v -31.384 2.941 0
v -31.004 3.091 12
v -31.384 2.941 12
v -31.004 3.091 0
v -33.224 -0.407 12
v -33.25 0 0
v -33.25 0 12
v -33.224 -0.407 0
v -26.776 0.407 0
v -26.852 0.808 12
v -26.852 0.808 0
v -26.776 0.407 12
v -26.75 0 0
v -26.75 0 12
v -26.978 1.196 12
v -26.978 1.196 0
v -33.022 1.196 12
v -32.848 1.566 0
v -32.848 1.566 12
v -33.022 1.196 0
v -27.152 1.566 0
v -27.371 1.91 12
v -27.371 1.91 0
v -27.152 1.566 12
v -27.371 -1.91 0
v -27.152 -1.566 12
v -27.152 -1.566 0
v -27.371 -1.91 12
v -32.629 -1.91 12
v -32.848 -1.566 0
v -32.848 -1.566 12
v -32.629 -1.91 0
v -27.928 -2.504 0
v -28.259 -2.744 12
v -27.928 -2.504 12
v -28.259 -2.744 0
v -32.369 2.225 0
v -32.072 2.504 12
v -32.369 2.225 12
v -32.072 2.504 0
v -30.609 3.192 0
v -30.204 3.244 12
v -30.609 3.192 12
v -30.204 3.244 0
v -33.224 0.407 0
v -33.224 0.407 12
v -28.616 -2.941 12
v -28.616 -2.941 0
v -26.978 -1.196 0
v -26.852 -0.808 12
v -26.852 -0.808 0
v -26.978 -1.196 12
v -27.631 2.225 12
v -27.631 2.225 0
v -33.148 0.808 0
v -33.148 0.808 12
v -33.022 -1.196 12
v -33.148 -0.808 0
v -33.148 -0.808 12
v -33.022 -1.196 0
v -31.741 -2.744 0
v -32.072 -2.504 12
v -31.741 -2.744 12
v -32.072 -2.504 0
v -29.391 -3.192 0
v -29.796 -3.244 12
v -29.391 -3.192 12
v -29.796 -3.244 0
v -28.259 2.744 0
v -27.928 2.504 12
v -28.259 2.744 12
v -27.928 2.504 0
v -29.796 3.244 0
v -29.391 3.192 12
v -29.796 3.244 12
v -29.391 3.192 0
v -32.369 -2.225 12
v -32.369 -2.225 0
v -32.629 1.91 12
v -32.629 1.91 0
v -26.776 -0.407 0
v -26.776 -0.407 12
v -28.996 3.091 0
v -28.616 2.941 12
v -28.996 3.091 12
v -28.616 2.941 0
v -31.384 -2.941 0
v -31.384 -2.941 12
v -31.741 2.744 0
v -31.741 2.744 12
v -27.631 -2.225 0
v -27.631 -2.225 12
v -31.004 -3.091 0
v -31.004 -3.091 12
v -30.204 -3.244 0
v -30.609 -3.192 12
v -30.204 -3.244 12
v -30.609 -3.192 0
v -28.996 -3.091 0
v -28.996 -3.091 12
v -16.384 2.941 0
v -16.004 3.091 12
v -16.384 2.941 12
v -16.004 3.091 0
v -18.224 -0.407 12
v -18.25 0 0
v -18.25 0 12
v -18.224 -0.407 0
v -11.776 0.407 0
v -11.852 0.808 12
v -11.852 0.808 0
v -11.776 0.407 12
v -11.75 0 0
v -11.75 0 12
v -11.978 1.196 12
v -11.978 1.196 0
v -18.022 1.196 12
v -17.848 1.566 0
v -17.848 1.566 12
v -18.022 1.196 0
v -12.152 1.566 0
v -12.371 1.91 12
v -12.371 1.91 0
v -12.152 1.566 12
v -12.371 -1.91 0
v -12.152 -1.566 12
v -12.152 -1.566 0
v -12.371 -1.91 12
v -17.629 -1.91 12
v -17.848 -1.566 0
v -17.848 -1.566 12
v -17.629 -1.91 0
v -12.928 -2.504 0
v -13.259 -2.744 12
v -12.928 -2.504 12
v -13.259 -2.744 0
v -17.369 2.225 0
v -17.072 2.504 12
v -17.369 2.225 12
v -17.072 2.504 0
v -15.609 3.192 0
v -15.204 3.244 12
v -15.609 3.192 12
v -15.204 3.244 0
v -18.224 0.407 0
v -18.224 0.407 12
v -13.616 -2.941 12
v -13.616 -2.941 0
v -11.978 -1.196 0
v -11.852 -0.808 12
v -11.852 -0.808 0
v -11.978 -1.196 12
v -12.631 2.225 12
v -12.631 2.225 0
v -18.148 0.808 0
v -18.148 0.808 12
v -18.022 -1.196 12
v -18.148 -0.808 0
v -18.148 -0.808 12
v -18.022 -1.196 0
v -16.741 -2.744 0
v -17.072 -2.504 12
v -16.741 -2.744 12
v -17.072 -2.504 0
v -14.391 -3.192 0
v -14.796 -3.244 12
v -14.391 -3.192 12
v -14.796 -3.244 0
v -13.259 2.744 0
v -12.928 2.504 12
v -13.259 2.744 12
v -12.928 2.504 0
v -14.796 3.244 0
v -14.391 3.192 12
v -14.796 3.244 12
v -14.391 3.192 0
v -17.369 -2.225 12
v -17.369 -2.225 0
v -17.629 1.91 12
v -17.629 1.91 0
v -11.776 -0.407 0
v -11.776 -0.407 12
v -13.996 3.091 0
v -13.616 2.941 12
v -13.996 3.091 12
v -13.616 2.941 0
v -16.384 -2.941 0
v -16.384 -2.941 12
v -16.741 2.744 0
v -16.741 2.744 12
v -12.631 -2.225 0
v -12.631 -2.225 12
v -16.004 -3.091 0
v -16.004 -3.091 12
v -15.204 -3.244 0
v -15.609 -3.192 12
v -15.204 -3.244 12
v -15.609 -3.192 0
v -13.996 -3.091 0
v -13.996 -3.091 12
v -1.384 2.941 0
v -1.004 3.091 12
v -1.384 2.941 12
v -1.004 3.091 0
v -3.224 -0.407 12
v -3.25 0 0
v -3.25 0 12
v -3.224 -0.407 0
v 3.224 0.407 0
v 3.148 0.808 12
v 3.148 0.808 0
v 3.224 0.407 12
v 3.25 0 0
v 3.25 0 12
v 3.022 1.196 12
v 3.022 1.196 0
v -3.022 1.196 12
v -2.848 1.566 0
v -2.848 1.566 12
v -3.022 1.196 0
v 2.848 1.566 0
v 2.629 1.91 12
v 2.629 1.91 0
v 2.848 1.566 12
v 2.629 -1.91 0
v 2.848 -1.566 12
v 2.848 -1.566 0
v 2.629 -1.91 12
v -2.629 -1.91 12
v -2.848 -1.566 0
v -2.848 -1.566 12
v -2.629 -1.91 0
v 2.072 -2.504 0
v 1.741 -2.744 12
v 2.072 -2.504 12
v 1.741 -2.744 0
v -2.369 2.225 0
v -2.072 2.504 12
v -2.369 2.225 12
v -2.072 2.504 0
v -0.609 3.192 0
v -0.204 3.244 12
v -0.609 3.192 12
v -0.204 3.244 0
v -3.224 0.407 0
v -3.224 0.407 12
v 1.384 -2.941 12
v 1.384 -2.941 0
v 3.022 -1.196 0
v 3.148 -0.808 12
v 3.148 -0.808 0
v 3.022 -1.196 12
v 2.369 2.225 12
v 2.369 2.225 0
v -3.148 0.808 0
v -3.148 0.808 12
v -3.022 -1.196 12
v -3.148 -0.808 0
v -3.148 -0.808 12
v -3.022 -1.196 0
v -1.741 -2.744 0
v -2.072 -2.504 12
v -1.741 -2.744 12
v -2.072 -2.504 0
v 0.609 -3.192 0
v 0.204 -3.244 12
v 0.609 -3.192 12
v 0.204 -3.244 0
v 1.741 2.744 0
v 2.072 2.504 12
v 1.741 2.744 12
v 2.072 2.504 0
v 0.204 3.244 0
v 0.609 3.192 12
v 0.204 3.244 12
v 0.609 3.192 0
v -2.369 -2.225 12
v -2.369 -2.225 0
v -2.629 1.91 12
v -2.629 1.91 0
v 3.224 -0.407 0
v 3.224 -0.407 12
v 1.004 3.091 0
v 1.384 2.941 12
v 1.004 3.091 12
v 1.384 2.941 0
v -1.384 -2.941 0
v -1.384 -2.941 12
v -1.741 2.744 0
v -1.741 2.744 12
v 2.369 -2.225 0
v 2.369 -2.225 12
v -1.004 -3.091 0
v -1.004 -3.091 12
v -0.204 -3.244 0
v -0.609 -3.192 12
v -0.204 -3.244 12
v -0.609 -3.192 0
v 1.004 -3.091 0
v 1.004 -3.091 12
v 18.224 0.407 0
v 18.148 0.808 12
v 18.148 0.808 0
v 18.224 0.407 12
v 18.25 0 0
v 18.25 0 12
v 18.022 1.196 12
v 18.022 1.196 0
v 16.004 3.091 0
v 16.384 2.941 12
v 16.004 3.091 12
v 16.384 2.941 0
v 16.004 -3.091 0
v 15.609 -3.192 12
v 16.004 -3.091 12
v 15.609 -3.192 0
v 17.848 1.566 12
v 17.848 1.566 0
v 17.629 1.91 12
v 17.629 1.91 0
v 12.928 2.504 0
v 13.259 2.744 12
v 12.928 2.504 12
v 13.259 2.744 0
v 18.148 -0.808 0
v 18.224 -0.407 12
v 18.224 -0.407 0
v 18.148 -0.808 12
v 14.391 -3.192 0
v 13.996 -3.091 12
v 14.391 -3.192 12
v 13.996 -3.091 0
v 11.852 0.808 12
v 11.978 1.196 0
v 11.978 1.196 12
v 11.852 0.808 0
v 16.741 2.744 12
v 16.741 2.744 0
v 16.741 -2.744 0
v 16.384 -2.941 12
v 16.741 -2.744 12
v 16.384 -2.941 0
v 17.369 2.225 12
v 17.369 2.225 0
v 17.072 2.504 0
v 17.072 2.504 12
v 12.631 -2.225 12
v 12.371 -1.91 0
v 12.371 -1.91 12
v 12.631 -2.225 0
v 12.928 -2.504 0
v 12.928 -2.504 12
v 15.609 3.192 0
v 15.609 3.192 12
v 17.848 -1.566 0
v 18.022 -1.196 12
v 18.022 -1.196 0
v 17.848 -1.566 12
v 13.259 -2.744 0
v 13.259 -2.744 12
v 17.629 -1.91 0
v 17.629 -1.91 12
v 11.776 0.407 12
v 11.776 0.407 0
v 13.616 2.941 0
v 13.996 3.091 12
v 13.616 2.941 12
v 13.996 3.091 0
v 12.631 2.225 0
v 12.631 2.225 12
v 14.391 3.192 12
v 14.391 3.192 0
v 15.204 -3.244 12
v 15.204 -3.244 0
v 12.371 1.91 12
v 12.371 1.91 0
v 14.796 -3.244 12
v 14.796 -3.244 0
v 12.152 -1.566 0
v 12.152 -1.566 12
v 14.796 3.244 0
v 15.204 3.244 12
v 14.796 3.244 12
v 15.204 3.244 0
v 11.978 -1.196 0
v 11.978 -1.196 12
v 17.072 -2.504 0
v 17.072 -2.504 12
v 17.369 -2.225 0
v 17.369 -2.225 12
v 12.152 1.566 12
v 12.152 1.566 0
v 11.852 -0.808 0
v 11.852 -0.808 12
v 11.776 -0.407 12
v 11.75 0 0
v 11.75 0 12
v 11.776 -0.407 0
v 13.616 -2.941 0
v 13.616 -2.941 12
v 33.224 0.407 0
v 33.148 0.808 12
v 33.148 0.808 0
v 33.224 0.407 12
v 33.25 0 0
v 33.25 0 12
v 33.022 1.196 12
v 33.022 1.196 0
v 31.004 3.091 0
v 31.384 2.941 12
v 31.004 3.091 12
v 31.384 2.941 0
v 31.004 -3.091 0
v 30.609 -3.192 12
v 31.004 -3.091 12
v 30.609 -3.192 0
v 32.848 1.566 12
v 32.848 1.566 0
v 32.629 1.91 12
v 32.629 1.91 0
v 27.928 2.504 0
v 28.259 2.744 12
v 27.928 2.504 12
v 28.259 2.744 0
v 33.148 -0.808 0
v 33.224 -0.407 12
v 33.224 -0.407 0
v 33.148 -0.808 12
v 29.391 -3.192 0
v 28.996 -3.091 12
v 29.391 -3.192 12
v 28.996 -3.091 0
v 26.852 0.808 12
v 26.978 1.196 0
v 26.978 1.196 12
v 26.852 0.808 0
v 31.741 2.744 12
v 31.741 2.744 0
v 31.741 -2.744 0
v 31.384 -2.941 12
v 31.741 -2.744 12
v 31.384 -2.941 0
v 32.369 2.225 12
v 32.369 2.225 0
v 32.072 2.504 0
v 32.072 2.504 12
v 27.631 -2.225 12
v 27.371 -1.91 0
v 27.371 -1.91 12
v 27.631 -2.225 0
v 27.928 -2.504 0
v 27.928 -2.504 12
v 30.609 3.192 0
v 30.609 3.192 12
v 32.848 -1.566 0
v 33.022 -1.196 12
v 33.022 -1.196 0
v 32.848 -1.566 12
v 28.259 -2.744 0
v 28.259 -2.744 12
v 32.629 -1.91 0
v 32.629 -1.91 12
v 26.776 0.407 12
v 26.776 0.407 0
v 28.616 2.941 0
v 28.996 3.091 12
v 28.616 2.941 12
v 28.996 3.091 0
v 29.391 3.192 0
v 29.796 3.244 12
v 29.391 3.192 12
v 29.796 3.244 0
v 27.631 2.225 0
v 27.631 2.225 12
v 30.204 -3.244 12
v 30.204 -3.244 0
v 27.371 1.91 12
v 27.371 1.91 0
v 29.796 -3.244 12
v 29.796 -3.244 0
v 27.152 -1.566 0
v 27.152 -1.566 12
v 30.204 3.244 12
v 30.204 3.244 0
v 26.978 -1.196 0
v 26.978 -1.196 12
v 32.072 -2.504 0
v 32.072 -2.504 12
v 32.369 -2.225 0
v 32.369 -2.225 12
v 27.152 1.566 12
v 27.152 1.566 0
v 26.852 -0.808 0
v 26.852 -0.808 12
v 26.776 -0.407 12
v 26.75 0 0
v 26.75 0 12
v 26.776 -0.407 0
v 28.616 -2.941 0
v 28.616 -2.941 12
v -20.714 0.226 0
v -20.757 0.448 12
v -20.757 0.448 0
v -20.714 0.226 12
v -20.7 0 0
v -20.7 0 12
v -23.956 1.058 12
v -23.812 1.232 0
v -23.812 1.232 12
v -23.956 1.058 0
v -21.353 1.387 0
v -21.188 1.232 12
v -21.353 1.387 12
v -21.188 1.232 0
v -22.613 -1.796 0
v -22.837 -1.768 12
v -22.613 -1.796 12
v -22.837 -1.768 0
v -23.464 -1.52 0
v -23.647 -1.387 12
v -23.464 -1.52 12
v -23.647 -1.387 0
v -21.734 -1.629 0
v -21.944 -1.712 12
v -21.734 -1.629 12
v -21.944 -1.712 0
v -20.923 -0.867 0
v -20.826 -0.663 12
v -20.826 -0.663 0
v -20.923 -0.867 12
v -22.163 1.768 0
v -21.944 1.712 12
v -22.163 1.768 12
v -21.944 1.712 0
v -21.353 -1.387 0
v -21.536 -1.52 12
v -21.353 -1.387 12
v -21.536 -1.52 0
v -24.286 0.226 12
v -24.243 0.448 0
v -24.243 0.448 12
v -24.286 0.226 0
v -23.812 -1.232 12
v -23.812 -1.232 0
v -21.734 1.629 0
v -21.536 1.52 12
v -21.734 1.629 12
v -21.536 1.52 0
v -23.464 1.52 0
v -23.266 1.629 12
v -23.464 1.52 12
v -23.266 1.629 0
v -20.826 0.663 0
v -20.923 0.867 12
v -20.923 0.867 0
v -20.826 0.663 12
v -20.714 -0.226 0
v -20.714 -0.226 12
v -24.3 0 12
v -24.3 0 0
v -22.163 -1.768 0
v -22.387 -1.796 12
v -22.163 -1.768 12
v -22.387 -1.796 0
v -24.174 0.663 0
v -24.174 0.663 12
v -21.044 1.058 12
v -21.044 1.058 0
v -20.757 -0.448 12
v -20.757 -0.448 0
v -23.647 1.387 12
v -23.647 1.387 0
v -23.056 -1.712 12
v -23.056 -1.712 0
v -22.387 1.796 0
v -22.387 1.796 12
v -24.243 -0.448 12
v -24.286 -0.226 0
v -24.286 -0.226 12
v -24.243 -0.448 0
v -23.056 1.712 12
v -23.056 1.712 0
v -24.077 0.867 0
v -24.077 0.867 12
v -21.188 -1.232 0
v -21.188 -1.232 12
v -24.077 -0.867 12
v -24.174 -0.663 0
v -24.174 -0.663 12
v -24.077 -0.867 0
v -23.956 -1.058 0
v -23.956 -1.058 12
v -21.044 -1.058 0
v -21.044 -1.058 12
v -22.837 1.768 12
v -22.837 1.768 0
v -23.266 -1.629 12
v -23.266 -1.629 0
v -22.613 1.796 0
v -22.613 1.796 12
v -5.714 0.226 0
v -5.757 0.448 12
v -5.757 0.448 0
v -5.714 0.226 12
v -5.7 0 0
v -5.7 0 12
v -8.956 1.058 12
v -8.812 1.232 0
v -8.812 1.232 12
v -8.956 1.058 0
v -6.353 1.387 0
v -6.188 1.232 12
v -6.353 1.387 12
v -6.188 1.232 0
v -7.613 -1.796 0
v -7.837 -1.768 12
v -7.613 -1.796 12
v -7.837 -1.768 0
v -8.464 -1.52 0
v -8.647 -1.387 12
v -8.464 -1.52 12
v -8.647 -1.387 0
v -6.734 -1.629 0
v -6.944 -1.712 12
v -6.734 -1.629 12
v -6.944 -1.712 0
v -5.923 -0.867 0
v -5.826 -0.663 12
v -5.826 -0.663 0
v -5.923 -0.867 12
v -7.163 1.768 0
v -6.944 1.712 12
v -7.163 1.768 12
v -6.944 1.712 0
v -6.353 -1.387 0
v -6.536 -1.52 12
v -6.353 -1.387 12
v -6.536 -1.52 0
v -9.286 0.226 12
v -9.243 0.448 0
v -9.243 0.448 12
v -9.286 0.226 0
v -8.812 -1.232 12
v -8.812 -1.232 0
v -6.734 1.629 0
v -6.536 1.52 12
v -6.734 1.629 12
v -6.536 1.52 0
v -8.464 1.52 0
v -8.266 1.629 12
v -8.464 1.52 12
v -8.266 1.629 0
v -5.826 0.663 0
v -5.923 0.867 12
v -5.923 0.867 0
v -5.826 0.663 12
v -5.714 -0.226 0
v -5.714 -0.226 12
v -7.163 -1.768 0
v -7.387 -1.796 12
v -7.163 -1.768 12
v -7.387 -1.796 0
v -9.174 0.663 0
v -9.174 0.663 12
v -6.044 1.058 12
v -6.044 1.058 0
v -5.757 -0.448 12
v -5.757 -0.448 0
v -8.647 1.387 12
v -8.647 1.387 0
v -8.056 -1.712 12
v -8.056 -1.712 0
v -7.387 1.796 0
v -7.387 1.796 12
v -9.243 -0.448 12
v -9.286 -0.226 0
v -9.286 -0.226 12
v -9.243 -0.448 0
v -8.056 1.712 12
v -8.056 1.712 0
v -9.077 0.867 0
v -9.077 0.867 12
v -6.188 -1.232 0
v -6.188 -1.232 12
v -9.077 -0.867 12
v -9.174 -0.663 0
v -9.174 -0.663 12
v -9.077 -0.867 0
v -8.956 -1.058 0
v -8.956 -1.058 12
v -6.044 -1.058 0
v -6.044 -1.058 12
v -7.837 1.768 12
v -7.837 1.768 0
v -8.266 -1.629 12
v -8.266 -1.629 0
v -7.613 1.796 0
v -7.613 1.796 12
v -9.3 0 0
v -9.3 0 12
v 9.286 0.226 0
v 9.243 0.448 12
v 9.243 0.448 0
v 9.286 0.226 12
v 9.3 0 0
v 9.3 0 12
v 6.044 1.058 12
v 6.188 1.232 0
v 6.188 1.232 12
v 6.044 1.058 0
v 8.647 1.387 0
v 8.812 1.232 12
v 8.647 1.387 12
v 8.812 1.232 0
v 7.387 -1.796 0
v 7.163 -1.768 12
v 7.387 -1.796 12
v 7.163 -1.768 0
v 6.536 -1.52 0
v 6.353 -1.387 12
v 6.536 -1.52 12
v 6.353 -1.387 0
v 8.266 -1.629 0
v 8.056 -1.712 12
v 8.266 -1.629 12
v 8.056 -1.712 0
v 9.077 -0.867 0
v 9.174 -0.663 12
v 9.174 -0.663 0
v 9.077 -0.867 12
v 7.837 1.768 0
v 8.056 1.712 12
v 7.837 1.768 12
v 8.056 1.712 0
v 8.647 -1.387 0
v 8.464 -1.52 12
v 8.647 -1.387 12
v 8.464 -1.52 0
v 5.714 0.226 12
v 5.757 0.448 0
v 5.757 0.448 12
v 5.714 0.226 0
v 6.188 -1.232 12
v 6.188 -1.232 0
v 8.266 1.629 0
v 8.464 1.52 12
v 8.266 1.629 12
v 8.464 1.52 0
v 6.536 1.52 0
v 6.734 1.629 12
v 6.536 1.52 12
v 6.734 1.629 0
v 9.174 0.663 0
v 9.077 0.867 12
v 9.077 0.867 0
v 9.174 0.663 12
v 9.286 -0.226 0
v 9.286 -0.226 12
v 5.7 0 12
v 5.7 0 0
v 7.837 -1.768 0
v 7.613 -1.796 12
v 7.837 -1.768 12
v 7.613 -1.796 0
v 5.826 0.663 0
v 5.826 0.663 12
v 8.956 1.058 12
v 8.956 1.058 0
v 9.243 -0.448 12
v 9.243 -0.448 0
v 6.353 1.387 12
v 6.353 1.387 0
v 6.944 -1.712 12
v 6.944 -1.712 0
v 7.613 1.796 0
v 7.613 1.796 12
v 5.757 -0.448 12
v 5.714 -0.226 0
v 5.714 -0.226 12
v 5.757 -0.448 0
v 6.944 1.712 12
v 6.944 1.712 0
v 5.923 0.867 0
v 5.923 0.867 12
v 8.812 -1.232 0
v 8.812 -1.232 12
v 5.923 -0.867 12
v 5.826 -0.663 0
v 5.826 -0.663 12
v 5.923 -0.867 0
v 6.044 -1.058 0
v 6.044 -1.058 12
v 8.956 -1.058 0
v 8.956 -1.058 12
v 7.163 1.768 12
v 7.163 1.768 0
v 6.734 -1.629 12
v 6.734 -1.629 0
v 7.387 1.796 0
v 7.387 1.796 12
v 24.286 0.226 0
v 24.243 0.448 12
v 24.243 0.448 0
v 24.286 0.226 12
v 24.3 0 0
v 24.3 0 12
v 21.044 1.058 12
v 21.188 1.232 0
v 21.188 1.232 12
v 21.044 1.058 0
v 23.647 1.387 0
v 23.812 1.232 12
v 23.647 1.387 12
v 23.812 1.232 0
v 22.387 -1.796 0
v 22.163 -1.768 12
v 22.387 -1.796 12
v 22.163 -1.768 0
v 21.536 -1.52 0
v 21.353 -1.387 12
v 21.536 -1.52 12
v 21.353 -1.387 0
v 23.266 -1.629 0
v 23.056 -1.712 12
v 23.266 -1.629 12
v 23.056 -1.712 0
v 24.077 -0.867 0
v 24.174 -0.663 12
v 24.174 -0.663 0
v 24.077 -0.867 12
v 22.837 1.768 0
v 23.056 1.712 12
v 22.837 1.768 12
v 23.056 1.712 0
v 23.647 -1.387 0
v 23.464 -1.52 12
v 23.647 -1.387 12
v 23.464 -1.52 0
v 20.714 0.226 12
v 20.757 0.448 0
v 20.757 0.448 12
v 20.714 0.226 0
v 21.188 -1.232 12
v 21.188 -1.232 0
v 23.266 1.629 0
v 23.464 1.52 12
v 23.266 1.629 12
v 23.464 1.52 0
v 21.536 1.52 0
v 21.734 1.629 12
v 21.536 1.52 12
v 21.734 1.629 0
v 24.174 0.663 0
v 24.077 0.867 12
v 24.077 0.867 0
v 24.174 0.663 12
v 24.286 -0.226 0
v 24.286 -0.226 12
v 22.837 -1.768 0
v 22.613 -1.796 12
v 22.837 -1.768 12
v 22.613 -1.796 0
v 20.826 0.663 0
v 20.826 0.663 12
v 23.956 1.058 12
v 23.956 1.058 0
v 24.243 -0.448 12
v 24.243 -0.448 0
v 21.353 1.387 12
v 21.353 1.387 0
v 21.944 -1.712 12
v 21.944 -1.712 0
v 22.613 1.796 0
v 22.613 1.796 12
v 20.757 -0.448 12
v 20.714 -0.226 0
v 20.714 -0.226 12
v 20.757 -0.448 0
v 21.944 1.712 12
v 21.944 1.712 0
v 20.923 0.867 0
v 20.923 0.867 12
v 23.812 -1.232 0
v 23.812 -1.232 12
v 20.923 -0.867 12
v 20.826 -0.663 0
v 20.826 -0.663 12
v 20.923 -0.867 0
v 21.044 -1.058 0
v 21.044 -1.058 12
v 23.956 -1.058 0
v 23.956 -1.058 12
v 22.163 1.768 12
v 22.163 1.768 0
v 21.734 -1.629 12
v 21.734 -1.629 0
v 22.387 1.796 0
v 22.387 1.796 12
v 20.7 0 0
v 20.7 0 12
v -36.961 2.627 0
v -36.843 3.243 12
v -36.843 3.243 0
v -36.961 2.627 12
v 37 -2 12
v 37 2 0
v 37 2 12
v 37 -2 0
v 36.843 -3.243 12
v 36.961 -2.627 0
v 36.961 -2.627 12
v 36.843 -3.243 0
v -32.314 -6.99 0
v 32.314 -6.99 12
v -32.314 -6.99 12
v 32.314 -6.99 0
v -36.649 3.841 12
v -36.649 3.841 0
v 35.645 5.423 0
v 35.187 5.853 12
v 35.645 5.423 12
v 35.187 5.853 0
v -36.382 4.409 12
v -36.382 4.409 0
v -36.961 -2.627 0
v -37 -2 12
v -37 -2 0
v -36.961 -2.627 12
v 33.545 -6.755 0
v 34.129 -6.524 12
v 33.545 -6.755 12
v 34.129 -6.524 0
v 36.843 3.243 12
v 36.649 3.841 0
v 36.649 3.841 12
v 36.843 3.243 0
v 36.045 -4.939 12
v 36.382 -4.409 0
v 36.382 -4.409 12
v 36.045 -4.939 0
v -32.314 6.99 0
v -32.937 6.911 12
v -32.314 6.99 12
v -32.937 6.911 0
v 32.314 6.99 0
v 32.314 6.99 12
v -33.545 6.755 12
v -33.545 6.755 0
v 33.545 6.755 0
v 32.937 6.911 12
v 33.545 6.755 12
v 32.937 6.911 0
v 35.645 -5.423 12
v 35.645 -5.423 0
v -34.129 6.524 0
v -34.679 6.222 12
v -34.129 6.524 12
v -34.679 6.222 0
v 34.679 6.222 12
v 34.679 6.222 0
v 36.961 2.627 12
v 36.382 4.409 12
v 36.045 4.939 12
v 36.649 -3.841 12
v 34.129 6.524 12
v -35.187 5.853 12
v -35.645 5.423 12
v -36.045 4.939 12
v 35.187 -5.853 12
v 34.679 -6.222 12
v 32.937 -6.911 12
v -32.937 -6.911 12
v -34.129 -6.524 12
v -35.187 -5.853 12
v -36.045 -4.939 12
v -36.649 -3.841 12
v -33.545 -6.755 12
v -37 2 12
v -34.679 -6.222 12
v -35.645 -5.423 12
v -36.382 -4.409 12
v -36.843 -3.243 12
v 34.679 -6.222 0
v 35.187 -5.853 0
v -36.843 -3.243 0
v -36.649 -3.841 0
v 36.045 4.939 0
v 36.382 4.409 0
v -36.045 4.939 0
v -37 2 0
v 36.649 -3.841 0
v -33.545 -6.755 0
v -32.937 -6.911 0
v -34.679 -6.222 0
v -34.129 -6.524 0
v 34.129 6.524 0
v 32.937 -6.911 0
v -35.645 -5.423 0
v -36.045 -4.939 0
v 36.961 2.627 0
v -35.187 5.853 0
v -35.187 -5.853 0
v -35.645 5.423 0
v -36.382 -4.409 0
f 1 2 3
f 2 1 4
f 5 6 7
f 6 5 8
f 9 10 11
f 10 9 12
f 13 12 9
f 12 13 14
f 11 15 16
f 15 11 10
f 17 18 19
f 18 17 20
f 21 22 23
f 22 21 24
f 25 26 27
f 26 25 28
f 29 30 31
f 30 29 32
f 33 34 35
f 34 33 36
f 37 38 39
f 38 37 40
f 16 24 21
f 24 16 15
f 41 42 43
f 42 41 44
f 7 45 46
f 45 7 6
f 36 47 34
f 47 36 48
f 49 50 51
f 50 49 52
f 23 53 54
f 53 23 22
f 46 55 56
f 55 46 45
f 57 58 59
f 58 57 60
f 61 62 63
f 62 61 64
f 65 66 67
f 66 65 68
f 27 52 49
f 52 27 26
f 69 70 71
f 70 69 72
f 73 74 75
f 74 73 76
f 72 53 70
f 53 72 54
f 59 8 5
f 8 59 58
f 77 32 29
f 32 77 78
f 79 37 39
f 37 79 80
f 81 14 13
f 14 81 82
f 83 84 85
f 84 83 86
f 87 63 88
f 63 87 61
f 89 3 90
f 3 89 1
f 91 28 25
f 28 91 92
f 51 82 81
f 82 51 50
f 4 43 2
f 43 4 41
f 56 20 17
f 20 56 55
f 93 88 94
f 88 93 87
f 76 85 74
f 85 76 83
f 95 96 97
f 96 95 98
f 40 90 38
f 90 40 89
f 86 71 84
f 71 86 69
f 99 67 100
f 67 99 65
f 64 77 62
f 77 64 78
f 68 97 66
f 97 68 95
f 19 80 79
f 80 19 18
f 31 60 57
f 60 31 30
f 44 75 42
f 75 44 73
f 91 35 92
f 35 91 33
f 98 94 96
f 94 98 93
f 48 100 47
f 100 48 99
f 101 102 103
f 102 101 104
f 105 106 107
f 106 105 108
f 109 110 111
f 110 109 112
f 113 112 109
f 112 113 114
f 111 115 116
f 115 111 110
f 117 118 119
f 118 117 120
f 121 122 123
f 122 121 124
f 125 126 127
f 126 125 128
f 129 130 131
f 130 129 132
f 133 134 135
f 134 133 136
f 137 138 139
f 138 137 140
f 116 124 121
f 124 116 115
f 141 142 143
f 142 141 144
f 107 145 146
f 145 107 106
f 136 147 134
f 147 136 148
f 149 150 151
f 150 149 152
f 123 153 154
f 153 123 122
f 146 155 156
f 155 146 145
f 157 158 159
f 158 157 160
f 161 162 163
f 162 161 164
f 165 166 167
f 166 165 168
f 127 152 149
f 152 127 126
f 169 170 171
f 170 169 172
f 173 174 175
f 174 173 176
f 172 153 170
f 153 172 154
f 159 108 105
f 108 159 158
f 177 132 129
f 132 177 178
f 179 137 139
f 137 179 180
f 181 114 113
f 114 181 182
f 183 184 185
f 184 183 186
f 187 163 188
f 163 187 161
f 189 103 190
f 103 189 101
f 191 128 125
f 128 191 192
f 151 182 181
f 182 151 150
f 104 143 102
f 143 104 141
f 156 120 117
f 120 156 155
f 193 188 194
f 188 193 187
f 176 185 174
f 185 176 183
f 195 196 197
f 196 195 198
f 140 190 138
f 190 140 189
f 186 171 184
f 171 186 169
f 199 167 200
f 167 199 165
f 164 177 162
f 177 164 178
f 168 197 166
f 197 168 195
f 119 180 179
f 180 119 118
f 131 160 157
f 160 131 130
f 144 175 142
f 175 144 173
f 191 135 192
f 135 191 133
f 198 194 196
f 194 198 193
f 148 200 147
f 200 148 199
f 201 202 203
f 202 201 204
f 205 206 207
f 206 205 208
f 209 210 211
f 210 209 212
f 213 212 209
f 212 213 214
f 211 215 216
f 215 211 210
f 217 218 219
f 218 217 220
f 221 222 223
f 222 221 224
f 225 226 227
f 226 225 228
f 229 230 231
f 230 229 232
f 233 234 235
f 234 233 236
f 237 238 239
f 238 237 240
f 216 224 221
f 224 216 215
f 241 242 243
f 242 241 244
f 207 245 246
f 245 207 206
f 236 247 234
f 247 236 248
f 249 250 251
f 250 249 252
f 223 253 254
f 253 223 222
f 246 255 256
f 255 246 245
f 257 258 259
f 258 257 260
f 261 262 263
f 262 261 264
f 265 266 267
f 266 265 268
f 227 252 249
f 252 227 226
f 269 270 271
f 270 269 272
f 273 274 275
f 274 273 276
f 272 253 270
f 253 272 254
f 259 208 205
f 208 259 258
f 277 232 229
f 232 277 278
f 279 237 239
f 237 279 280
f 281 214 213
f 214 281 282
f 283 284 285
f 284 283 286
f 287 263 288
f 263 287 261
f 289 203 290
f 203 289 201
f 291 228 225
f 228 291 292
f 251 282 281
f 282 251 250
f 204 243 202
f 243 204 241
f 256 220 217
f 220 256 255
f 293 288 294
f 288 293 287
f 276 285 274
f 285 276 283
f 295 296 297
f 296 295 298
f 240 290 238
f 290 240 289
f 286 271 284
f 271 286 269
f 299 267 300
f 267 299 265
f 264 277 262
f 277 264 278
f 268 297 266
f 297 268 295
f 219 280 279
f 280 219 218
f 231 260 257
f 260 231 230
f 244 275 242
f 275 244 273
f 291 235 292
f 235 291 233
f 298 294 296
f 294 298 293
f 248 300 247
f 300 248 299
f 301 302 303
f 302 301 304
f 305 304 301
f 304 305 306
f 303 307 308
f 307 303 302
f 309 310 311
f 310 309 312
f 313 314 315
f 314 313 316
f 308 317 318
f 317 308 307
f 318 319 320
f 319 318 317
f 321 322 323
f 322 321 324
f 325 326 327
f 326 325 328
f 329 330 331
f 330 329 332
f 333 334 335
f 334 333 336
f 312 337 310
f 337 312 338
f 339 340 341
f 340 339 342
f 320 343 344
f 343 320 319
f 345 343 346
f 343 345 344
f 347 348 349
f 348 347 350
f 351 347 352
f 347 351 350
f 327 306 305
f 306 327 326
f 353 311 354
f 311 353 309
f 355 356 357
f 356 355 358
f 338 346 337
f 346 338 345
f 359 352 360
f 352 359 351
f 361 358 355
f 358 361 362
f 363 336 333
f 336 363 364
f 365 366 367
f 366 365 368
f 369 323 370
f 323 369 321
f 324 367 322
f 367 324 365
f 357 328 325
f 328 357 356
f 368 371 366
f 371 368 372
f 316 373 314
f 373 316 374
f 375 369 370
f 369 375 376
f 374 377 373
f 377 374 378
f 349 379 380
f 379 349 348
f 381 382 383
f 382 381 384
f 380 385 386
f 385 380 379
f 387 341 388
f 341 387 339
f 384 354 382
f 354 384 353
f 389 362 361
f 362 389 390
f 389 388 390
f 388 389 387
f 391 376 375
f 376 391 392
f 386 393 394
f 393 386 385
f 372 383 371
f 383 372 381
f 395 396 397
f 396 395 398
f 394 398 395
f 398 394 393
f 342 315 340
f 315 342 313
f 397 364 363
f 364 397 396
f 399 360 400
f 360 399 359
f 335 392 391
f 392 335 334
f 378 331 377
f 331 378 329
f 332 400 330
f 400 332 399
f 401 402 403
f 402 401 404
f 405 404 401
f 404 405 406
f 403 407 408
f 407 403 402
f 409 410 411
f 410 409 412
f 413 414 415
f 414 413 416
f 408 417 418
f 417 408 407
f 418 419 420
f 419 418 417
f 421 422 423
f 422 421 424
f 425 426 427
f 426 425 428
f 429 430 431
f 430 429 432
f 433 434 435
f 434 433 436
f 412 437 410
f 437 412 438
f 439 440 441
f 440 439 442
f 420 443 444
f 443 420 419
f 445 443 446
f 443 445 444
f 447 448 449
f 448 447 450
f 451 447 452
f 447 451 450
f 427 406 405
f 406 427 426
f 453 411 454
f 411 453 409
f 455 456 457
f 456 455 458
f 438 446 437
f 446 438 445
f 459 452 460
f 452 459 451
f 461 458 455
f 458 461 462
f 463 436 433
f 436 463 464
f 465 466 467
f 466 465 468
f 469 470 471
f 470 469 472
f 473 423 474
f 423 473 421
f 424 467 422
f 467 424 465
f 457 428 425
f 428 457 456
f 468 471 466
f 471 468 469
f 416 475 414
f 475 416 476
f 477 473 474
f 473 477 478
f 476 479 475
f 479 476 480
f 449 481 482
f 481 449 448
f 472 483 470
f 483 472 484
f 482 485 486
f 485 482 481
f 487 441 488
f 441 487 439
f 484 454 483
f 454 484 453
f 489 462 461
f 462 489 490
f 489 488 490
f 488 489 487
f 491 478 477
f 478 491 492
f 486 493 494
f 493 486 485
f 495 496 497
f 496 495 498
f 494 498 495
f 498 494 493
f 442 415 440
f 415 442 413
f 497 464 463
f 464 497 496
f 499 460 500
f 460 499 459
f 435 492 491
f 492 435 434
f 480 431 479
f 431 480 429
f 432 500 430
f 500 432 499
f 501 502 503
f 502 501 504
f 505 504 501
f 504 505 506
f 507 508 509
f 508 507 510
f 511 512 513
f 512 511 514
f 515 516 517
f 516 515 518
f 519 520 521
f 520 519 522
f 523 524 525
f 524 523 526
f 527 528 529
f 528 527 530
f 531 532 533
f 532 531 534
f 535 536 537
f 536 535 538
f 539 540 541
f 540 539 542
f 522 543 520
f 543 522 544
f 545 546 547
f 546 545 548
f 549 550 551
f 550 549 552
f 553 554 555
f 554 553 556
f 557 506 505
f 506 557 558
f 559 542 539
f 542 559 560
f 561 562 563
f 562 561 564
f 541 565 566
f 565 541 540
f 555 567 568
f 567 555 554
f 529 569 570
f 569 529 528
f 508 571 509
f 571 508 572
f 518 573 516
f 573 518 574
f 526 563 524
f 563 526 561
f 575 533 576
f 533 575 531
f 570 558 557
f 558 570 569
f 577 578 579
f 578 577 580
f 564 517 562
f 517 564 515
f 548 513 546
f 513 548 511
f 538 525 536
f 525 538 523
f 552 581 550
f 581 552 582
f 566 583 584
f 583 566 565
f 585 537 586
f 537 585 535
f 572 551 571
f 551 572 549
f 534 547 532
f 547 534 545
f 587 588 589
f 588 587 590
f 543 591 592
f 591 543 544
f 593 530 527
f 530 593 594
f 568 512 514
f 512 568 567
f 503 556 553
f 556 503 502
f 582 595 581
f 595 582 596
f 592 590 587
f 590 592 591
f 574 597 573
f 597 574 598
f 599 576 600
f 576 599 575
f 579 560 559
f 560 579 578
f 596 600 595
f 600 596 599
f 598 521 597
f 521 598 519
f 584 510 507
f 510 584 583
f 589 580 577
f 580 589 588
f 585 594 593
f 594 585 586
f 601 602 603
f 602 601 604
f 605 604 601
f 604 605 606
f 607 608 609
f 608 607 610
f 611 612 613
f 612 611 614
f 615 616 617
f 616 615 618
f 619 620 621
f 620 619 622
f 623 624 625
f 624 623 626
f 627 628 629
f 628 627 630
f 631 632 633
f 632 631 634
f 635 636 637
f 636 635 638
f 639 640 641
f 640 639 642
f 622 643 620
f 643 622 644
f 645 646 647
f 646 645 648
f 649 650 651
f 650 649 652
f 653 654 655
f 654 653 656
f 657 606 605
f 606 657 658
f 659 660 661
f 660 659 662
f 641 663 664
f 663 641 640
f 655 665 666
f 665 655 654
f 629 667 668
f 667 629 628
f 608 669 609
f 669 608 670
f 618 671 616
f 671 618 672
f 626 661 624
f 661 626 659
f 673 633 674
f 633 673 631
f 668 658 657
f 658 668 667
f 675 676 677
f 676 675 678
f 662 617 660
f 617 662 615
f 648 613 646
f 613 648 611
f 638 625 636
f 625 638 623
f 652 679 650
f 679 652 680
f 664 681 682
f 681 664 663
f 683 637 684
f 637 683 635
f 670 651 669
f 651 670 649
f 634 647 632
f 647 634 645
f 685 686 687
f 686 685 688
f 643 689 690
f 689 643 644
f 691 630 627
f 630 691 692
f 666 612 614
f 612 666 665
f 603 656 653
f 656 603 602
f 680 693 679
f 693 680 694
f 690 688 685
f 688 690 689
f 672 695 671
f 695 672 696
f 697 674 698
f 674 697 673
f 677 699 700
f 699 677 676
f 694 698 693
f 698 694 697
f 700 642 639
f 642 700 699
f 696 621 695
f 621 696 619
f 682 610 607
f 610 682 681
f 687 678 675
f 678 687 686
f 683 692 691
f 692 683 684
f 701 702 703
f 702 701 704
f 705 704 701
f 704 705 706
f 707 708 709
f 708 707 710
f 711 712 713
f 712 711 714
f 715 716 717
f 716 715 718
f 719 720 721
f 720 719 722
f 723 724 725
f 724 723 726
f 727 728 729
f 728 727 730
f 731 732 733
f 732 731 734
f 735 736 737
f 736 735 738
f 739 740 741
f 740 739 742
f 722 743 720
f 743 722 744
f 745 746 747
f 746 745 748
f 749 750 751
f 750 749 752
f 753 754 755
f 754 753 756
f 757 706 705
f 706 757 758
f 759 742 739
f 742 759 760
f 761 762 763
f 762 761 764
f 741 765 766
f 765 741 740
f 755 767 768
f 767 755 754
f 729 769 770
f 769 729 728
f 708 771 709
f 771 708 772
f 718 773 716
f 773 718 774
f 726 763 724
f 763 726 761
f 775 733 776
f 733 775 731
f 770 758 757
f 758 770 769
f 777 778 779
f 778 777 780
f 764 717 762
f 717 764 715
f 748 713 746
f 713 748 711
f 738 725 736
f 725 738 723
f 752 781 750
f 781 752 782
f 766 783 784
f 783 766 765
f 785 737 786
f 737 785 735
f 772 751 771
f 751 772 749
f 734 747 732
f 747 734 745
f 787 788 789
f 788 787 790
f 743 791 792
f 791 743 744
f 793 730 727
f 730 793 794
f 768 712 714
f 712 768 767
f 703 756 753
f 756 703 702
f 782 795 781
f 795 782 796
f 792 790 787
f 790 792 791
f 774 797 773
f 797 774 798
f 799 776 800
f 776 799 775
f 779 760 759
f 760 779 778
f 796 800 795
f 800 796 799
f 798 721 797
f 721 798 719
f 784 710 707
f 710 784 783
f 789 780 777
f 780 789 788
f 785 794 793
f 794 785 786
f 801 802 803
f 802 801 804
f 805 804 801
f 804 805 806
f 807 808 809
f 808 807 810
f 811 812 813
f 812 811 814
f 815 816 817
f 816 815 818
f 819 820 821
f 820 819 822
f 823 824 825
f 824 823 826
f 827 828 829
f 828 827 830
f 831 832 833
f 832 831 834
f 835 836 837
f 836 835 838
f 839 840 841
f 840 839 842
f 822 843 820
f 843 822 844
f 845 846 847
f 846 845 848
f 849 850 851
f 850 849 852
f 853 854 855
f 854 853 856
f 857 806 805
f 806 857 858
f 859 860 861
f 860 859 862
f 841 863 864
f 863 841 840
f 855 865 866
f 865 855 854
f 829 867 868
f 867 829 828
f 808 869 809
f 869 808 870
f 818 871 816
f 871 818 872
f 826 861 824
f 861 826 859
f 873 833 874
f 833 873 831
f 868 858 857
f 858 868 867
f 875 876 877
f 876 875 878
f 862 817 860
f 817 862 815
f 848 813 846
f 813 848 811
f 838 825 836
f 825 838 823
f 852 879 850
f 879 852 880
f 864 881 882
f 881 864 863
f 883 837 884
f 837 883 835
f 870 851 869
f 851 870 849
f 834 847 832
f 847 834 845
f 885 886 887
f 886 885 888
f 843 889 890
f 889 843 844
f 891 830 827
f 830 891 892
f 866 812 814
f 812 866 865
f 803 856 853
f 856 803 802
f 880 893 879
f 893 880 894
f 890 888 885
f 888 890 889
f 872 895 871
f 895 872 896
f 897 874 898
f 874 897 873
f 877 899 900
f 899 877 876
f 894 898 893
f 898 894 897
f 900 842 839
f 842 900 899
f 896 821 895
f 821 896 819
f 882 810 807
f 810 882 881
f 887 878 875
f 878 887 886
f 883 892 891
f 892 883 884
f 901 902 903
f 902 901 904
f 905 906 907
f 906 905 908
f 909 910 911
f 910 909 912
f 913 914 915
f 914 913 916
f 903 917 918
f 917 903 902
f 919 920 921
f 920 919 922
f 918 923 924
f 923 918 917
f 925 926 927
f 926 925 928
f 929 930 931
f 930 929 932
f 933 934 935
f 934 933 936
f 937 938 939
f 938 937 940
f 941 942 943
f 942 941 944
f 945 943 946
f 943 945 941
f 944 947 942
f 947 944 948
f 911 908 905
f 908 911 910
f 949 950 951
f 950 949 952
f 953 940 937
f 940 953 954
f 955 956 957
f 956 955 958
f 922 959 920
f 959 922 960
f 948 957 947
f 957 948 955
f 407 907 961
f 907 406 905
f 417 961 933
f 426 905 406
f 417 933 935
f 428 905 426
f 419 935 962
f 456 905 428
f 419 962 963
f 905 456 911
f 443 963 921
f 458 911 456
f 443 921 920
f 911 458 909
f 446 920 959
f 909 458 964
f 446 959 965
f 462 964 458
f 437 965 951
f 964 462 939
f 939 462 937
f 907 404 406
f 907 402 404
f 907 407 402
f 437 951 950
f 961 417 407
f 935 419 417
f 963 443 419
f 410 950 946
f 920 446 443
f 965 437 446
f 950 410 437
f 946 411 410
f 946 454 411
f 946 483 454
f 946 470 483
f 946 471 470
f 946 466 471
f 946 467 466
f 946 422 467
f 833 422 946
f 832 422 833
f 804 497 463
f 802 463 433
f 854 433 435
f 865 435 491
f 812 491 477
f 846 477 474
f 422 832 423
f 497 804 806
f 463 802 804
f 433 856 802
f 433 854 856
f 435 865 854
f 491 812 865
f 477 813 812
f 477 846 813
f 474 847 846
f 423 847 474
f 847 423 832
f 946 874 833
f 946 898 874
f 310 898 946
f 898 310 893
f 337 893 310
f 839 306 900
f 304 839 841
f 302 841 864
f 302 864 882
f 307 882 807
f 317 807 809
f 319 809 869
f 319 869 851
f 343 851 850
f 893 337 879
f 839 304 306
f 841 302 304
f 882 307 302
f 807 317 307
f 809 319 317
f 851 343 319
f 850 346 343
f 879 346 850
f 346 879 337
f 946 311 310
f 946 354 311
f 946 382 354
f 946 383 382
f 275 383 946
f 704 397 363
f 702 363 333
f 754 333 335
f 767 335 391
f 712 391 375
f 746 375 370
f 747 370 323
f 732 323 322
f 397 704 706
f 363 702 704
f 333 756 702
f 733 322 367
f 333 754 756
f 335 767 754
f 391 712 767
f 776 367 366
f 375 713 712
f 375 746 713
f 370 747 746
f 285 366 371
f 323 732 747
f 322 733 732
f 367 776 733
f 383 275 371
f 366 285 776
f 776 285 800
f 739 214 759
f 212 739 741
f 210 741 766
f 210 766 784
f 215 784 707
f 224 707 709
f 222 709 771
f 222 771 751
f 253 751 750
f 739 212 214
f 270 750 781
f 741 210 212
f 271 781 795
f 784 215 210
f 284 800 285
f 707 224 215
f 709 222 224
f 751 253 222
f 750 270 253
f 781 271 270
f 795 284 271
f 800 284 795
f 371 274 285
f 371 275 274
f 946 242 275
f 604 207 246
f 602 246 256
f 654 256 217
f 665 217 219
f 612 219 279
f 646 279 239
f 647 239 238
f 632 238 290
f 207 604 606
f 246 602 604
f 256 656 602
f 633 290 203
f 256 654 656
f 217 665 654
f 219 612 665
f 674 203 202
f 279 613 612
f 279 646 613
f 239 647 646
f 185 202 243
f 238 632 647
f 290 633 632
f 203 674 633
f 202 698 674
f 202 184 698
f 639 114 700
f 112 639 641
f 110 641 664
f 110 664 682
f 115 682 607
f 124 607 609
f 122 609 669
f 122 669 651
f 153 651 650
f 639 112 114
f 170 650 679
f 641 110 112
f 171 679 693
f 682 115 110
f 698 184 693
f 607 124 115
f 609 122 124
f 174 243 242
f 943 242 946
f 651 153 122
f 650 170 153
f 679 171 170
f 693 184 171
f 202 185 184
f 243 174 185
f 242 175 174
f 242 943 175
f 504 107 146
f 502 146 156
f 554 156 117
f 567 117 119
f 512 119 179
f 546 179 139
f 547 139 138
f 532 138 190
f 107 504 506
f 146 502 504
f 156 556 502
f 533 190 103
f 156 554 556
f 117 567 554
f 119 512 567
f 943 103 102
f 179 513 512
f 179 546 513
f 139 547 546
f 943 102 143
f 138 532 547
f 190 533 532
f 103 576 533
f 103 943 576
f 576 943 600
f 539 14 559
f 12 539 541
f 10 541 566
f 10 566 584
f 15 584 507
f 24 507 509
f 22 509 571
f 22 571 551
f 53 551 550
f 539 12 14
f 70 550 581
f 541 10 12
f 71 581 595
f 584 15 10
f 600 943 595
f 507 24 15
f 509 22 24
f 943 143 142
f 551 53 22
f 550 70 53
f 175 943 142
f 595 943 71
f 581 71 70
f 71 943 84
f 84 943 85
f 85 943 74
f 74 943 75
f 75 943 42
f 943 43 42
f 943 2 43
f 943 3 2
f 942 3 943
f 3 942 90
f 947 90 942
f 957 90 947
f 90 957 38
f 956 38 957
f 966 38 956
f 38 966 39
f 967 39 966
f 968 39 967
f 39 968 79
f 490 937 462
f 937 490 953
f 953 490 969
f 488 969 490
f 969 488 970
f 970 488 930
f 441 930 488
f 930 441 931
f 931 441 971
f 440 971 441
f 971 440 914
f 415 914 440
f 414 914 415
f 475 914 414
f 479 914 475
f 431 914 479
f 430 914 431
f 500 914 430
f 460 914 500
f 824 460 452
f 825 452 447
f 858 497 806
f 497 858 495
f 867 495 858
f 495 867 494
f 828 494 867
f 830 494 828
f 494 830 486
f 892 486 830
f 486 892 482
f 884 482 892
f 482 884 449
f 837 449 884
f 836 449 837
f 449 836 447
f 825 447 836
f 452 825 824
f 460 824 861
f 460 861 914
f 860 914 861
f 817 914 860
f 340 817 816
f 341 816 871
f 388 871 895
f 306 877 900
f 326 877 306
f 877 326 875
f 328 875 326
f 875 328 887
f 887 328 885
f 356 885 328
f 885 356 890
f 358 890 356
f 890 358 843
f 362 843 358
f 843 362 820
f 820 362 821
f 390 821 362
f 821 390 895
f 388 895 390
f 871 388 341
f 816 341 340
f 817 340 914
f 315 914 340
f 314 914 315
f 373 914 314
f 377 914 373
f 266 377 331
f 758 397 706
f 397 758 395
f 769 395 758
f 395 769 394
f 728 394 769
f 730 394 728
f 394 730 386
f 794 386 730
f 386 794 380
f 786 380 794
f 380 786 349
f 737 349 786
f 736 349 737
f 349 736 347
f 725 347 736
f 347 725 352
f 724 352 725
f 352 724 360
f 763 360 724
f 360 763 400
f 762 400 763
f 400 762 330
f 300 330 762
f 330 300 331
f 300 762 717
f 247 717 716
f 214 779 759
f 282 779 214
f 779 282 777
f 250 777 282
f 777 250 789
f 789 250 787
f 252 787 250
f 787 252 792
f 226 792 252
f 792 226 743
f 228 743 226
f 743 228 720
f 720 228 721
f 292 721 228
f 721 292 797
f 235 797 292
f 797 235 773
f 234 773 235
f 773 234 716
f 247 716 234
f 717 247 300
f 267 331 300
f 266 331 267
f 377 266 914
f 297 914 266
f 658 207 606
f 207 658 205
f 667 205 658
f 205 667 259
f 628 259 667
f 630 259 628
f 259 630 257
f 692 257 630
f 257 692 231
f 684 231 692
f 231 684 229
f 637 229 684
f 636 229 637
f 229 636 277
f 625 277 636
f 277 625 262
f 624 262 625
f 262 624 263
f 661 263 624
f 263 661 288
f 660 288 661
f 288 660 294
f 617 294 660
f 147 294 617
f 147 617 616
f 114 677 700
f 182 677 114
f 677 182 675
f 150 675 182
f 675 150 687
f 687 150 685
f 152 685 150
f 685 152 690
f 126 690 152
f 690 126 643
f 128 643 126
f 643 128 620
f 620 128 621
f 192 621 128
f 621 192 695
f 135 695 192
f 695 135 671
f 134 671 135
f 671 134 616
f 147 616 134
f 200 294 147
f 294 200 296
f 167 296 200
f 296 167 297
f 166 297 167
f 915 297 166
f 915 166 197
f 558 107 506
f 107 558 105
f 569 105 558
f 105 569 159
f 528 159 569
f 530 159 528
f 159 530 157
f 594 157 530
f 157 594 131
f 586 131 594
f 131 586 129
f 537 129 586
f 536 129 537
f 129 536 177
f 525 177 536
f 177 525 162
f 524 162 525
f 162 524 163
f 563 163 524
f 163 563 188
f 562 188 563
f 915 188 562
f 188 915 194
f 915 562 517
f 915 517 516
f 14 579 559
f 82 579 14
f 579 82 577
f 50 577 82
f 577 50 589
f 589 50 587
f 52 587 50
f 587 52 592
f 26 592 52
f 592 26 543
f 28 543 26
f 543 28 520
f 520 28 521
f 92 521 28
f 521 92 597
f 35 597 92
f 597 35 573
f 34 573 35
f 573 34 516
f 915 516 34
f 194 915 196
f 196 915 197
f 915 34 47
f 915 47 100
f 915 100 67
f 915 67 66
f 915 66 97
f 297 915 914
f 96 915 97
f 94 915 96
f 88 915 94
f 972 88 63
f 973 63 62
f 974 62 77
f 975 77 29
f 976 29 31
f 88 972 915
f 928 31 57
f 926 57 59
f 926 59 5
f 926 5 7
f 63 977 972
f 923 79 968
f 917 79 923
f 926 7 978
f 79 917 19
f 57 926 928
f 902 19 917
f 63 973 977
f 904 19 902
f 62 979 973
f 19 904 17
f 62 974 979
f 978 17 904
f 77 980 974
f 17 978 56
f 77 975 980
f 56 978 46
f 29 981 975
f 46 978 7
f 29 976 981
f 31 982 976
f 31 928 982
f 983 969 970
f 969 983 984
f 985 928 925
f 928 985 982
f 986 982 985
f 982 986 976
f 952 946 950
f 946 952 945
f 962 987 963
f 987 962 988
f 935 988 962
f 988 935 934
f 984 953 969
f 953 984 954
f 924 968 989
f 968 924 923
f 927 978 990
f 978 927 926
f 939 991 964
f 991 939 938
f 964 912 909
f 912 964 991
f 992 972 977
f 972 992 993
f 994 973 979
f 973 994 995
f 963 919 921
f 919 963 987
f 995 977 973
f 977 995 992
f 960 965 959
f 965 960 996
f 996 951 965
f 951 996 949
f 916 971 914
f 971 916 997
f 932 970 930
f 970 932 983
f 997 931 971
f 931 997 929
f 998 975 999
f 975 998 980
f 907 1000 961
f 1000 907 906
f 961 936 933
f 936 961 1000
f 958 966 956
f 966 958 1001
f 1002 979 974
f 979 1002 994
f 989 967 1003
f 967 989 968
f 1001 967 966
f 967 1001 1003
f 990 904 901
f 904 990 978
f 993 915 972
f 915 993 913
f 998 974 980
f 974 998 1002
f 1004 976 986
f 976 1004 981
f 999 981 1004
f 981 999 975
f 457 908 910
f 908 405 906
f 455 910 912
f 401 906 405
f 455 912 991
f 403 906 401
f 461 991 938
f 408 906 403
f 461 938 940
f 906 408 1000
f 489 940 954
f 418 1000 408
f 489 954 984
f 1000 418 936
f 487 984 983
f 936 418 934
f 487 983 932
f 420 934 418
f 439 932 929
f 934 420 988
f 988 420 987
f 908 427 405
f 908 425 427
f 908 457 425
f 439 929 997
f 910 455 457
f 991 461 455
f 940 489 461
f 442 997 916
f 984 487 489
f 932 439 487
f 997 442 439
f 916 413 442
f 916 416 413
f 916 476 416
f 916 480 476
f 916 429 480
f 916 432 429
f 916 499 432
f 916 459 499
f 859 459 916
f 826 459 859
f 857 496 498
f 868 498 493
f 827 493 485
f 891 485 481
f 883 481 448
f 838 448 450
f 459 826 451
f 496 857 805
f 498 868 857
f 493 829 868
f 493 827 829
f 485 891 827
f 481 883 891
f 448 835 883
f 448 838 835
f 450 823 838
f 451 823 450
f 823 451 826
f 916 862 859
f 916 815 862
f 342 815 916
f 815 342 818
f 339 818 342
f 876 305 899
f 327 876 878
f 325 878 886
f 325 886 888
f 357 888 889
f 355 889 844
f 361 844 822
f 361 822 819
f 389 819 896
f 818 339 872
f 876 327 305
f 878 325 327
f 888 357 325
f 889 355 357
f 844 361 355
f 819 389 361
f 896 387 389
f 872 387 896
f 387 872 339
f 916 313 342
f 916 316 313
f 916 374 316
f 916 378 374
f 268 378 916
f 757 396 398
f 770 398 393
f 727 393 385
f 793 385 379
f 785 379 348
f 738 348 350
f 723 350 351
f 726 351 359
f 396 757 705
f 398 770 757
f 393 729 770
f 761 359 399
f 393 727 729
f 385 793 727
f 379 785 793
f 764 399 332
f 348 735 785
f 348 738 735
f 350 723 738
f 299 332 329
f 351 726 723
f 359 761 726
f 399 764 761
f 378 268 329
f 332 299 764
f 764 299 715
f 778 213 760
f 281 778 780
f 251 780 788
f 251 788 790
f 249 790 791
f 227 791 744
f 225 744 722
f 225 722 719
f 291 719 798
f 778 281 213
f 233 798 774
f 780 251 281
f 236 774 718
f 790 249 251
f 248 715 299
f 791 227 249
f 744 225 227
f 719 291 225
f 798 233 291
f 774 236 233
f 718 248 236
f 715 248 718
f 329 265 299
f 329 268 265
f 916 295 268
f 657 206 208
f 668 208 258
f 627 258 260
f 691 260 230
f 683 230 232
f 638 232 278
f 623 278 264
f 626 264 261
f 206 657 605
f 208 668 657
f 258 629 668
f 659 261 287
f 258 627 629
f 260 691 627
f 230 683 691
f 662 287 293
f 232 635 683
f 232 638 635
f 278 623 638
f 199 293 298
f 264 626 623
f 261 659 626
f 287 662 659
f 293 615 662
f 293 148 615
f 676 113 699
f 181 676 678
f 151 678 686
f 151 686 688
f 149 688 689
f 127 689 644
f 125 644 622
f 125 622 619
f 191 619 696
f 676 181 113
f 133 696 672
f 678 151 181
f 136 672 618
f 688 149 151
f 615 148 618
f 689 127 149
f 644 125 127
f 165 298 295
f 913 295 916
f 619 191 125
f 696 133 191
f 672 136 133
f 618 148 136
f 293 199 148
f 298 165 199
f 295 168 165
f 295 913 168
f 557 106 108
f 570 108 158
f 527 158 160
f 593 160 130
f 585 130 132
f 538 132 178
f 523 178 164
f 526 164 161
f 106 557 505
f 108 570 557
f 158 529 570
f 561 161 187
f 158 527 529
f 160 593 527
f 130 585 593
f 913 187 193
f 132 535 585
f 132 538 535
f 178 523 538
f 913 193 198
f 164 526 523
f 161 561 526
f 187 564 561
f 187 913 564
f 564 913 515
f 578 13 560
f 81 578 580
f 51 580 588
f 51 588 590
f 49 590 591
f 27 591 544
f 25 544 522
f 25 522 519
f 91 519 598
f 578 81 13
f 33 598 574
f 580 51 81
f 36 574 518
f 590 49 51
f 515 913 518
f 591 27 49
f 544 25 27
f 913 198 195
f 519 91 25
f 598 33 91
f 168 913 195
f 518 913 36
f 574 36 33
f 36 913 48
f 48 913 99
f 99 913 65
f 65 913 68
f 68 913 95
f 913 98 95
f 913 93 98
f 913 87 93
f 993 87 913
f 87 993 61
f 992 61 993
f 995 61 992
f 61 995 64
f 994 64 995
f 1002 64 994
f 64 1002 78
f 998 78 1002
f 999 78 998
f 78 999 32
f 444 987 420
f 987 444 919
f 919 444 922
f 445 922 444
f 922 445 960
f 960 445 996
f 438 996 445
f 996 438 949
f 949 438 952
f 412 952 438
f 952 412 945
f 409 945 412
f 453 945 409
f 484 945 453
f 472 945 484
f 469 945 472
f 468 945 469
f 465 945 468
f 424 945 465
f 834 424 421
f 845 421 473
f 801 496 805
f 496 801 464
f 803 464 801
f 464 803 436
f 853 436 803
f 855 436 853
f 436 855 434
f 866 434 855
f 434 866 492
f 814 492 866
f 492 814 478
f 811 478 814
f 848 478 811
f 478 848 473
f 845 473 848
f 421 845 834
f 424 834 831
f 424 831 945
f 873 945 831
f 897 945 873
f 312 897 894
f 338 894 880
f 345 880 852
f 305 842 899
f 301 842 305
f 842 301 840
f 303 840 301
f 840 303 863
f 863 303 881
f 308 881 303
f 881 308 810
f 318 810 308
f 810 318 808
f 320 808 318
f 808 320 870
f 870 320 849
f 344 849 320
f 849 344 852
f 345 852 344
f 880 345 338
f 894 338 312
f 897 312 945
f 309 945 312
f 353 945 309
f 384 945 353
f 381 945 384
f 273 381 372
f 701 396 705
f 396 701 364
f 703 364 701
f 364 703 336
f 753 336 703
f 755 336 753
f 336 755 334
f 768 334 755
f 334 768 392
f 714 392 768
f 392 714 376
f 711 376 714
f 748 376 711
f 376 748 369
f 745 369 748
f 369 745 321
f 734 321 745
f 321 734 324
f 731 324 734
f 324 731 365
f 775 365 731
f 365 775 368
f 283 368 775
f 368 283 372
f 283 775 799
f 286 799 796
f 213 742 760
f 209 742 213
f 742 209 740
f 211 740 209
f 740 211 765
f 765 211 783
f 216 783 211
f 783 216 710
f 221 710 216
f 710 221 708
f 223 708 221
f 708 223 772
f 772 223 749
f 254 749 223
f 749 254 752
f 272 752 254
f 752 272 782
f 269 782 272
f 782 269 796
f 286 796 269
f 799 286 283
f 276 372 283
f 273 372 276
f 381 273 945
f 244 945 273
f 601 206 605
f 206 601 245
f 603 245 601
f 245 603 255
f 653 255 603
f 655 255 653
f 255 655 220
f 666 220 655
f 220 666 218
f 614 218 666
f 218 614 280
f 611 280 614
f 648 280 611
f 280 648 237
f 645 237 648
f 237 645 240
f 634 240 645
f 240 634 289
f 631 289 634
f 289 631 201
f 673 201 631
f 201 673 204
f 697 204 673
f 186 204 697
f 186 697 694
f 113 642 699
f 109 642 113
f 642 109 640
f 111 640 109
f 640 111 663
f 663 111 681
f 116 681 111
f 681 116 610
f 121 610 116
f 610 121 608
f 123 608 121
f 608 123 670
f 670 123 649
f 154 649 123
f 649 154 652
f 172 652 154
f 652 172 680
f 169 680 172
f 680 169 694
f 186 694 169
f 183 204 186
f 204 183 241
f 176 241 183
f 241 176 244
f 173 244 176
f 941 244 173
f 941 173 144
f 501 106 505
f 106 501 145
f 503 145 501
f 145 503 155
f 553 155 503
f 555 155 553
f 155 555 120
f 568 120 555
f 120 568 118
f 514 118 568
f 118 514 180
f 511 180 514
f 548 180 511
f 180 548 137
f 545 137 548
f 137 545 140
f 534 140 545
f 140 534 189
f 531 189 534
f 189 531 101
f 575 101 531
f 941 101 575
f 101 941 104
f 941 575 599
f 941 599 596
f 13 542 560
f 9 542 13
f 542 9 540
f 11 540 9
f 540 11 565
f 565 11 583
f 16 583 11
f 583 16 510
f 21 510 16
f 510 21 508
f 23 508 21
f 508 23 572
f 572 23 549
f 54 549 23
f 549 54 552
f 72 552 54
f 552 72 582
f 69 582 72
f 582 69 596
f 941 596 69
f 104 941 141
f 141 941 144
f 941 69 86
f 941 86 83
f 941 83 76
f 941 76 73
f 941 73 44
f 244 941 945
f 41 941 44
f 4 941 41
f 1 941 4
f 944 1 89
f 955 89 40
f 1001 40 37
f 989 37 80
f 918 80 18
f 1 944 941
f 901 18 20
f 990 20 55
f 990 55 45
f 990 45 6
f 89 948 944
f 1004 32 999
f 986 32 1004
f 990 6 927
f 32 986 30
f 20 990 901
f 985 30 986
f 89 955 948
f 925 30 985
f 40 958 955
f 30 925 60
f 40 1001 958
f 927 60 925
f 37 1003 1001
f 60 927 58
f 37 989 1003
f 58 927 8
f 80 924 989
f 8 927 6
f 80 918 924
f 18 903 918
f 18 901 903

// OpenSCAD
$fn = 50;


difference() {
	union() {
		*color(alpha = 1.0000000000, c = "gray") {
			translate(v = [0, 7, 0]) {
				linear_extrude(height = 1) {
					text(font = "Arial:style=Bold", halign = "center", size = 4.5000000000, text = "COMMENT plate main", valign = "center");
				}
			}
		}
		hull() {
			translate(v = [-32.0000000000, 2.0000000000, 0]) {
				cylinder(h = 12, r = 5);
			}
			translate(v = [32.0000000000, 2.0000000000, 0]) {
				cylinder(h = 12, r = 5);
			}
			translate(v = [-32.0000000000, -2.0000000000, 0]) {
				cylinder(h = 12, r = 5);
			}
			translate(v = [32.0000000000, -2.0000000000, 0]) {
				cylinder(h = 12, r = 5);
			}
		}
	}
	union() {
		*color(alpha = 1.0000000000, c = "gray") {
			translate(v = [0, 7, 0]) {
				linear_extrude(height = 1) {
					text(font = "Arial:style=Bold", halign = "center", size = 4.5000000000, text = "COMMENT holes main", valign = "center");
				}
			}
		}
		translate(v = [-30.0000000000, 0.0000000000, 0]) {
			translate(v = [0, 0, -100]) {
				cylinder(h = 200, r = 3.2500000000);
			}
		}
		translate(v = [-15.0000000000, 0.0000000000, 0]) {
			translate(v = [0, 0, -100]) {
				cylinder(h = 200, r = 3.2500000000);
			}
		}
		translate(v = [0, 0, -100]) {
			cylinder(h = 200, r = 3.2500000000);
		}
		translate(v = [15.0000000000, 0.0000000000, 0]) {
			translate(v = [0, 0, -100]) {
				cylinder(h = 200, r = 3.2500000000);
			}
		}
		translate(v = [30.0000000000, 0.0000000000, 0]) {
			translate(v = [0, 0, -100]) {
				cylinder(h = 200, r = 3.2500000000);
			}
		}
		translate(v = [-30.0000000000, 0.0000000000, 0]) {
			translate(v = [0, 0, -100]) {
				cylinder(h = 200, r = 1.8000000000);
			}
		}
		translate(v = [-22.5000000000, 0.0000000000, 0]) {
			translate(v = [0, 0, -100]) {
				cylinder(h = 200, r = 1.8000000000);
			}
		}
		translate(v = [-15.0000000000, 0.0000000000, 0]) {
			translate(v = [0, 0, -100]) {
				cylinder(h = 200, r = 1.8000000000);
			}
		}
		translate(v = [-7.5000000000, 0.0000000000, 0]) {
			translate(v = [0, 0, -100]) {
				cylinder(h = 200, r = 1.8000000000);
			}
		}
		translate(v = [0, 0, -100]) {
			cylinder(h = 200, r = 1.8000000000);
		}
		translate(v = [7.5000000000, 0.0000000000, 0]) {
			translate(v = [0, 0, -100]) {
				cylinder(h = 200, r = 1.8000000000);
			}
		}
		translate(v = [15.0000000000, 0.0000000000, 0]) {
			translate(v = [0, 0, -100]) {
				cylinder(h = 200, r = 1.8000000000);
			}
		}
		translate(v = [22.5000000000, 0.0000000000, 0]) {
			translate(v = [0, 0, -100]) {
				cylinder(h = 200, r = 1.8000000000);
			}
		}
		translate(v = [30.0000000000, 0.0000000000, 0]) {
			translate(v = [0, 0, -100]) {
				cylinder(h = 200, r = 1.8000000000);
			}
		}
	}
}
